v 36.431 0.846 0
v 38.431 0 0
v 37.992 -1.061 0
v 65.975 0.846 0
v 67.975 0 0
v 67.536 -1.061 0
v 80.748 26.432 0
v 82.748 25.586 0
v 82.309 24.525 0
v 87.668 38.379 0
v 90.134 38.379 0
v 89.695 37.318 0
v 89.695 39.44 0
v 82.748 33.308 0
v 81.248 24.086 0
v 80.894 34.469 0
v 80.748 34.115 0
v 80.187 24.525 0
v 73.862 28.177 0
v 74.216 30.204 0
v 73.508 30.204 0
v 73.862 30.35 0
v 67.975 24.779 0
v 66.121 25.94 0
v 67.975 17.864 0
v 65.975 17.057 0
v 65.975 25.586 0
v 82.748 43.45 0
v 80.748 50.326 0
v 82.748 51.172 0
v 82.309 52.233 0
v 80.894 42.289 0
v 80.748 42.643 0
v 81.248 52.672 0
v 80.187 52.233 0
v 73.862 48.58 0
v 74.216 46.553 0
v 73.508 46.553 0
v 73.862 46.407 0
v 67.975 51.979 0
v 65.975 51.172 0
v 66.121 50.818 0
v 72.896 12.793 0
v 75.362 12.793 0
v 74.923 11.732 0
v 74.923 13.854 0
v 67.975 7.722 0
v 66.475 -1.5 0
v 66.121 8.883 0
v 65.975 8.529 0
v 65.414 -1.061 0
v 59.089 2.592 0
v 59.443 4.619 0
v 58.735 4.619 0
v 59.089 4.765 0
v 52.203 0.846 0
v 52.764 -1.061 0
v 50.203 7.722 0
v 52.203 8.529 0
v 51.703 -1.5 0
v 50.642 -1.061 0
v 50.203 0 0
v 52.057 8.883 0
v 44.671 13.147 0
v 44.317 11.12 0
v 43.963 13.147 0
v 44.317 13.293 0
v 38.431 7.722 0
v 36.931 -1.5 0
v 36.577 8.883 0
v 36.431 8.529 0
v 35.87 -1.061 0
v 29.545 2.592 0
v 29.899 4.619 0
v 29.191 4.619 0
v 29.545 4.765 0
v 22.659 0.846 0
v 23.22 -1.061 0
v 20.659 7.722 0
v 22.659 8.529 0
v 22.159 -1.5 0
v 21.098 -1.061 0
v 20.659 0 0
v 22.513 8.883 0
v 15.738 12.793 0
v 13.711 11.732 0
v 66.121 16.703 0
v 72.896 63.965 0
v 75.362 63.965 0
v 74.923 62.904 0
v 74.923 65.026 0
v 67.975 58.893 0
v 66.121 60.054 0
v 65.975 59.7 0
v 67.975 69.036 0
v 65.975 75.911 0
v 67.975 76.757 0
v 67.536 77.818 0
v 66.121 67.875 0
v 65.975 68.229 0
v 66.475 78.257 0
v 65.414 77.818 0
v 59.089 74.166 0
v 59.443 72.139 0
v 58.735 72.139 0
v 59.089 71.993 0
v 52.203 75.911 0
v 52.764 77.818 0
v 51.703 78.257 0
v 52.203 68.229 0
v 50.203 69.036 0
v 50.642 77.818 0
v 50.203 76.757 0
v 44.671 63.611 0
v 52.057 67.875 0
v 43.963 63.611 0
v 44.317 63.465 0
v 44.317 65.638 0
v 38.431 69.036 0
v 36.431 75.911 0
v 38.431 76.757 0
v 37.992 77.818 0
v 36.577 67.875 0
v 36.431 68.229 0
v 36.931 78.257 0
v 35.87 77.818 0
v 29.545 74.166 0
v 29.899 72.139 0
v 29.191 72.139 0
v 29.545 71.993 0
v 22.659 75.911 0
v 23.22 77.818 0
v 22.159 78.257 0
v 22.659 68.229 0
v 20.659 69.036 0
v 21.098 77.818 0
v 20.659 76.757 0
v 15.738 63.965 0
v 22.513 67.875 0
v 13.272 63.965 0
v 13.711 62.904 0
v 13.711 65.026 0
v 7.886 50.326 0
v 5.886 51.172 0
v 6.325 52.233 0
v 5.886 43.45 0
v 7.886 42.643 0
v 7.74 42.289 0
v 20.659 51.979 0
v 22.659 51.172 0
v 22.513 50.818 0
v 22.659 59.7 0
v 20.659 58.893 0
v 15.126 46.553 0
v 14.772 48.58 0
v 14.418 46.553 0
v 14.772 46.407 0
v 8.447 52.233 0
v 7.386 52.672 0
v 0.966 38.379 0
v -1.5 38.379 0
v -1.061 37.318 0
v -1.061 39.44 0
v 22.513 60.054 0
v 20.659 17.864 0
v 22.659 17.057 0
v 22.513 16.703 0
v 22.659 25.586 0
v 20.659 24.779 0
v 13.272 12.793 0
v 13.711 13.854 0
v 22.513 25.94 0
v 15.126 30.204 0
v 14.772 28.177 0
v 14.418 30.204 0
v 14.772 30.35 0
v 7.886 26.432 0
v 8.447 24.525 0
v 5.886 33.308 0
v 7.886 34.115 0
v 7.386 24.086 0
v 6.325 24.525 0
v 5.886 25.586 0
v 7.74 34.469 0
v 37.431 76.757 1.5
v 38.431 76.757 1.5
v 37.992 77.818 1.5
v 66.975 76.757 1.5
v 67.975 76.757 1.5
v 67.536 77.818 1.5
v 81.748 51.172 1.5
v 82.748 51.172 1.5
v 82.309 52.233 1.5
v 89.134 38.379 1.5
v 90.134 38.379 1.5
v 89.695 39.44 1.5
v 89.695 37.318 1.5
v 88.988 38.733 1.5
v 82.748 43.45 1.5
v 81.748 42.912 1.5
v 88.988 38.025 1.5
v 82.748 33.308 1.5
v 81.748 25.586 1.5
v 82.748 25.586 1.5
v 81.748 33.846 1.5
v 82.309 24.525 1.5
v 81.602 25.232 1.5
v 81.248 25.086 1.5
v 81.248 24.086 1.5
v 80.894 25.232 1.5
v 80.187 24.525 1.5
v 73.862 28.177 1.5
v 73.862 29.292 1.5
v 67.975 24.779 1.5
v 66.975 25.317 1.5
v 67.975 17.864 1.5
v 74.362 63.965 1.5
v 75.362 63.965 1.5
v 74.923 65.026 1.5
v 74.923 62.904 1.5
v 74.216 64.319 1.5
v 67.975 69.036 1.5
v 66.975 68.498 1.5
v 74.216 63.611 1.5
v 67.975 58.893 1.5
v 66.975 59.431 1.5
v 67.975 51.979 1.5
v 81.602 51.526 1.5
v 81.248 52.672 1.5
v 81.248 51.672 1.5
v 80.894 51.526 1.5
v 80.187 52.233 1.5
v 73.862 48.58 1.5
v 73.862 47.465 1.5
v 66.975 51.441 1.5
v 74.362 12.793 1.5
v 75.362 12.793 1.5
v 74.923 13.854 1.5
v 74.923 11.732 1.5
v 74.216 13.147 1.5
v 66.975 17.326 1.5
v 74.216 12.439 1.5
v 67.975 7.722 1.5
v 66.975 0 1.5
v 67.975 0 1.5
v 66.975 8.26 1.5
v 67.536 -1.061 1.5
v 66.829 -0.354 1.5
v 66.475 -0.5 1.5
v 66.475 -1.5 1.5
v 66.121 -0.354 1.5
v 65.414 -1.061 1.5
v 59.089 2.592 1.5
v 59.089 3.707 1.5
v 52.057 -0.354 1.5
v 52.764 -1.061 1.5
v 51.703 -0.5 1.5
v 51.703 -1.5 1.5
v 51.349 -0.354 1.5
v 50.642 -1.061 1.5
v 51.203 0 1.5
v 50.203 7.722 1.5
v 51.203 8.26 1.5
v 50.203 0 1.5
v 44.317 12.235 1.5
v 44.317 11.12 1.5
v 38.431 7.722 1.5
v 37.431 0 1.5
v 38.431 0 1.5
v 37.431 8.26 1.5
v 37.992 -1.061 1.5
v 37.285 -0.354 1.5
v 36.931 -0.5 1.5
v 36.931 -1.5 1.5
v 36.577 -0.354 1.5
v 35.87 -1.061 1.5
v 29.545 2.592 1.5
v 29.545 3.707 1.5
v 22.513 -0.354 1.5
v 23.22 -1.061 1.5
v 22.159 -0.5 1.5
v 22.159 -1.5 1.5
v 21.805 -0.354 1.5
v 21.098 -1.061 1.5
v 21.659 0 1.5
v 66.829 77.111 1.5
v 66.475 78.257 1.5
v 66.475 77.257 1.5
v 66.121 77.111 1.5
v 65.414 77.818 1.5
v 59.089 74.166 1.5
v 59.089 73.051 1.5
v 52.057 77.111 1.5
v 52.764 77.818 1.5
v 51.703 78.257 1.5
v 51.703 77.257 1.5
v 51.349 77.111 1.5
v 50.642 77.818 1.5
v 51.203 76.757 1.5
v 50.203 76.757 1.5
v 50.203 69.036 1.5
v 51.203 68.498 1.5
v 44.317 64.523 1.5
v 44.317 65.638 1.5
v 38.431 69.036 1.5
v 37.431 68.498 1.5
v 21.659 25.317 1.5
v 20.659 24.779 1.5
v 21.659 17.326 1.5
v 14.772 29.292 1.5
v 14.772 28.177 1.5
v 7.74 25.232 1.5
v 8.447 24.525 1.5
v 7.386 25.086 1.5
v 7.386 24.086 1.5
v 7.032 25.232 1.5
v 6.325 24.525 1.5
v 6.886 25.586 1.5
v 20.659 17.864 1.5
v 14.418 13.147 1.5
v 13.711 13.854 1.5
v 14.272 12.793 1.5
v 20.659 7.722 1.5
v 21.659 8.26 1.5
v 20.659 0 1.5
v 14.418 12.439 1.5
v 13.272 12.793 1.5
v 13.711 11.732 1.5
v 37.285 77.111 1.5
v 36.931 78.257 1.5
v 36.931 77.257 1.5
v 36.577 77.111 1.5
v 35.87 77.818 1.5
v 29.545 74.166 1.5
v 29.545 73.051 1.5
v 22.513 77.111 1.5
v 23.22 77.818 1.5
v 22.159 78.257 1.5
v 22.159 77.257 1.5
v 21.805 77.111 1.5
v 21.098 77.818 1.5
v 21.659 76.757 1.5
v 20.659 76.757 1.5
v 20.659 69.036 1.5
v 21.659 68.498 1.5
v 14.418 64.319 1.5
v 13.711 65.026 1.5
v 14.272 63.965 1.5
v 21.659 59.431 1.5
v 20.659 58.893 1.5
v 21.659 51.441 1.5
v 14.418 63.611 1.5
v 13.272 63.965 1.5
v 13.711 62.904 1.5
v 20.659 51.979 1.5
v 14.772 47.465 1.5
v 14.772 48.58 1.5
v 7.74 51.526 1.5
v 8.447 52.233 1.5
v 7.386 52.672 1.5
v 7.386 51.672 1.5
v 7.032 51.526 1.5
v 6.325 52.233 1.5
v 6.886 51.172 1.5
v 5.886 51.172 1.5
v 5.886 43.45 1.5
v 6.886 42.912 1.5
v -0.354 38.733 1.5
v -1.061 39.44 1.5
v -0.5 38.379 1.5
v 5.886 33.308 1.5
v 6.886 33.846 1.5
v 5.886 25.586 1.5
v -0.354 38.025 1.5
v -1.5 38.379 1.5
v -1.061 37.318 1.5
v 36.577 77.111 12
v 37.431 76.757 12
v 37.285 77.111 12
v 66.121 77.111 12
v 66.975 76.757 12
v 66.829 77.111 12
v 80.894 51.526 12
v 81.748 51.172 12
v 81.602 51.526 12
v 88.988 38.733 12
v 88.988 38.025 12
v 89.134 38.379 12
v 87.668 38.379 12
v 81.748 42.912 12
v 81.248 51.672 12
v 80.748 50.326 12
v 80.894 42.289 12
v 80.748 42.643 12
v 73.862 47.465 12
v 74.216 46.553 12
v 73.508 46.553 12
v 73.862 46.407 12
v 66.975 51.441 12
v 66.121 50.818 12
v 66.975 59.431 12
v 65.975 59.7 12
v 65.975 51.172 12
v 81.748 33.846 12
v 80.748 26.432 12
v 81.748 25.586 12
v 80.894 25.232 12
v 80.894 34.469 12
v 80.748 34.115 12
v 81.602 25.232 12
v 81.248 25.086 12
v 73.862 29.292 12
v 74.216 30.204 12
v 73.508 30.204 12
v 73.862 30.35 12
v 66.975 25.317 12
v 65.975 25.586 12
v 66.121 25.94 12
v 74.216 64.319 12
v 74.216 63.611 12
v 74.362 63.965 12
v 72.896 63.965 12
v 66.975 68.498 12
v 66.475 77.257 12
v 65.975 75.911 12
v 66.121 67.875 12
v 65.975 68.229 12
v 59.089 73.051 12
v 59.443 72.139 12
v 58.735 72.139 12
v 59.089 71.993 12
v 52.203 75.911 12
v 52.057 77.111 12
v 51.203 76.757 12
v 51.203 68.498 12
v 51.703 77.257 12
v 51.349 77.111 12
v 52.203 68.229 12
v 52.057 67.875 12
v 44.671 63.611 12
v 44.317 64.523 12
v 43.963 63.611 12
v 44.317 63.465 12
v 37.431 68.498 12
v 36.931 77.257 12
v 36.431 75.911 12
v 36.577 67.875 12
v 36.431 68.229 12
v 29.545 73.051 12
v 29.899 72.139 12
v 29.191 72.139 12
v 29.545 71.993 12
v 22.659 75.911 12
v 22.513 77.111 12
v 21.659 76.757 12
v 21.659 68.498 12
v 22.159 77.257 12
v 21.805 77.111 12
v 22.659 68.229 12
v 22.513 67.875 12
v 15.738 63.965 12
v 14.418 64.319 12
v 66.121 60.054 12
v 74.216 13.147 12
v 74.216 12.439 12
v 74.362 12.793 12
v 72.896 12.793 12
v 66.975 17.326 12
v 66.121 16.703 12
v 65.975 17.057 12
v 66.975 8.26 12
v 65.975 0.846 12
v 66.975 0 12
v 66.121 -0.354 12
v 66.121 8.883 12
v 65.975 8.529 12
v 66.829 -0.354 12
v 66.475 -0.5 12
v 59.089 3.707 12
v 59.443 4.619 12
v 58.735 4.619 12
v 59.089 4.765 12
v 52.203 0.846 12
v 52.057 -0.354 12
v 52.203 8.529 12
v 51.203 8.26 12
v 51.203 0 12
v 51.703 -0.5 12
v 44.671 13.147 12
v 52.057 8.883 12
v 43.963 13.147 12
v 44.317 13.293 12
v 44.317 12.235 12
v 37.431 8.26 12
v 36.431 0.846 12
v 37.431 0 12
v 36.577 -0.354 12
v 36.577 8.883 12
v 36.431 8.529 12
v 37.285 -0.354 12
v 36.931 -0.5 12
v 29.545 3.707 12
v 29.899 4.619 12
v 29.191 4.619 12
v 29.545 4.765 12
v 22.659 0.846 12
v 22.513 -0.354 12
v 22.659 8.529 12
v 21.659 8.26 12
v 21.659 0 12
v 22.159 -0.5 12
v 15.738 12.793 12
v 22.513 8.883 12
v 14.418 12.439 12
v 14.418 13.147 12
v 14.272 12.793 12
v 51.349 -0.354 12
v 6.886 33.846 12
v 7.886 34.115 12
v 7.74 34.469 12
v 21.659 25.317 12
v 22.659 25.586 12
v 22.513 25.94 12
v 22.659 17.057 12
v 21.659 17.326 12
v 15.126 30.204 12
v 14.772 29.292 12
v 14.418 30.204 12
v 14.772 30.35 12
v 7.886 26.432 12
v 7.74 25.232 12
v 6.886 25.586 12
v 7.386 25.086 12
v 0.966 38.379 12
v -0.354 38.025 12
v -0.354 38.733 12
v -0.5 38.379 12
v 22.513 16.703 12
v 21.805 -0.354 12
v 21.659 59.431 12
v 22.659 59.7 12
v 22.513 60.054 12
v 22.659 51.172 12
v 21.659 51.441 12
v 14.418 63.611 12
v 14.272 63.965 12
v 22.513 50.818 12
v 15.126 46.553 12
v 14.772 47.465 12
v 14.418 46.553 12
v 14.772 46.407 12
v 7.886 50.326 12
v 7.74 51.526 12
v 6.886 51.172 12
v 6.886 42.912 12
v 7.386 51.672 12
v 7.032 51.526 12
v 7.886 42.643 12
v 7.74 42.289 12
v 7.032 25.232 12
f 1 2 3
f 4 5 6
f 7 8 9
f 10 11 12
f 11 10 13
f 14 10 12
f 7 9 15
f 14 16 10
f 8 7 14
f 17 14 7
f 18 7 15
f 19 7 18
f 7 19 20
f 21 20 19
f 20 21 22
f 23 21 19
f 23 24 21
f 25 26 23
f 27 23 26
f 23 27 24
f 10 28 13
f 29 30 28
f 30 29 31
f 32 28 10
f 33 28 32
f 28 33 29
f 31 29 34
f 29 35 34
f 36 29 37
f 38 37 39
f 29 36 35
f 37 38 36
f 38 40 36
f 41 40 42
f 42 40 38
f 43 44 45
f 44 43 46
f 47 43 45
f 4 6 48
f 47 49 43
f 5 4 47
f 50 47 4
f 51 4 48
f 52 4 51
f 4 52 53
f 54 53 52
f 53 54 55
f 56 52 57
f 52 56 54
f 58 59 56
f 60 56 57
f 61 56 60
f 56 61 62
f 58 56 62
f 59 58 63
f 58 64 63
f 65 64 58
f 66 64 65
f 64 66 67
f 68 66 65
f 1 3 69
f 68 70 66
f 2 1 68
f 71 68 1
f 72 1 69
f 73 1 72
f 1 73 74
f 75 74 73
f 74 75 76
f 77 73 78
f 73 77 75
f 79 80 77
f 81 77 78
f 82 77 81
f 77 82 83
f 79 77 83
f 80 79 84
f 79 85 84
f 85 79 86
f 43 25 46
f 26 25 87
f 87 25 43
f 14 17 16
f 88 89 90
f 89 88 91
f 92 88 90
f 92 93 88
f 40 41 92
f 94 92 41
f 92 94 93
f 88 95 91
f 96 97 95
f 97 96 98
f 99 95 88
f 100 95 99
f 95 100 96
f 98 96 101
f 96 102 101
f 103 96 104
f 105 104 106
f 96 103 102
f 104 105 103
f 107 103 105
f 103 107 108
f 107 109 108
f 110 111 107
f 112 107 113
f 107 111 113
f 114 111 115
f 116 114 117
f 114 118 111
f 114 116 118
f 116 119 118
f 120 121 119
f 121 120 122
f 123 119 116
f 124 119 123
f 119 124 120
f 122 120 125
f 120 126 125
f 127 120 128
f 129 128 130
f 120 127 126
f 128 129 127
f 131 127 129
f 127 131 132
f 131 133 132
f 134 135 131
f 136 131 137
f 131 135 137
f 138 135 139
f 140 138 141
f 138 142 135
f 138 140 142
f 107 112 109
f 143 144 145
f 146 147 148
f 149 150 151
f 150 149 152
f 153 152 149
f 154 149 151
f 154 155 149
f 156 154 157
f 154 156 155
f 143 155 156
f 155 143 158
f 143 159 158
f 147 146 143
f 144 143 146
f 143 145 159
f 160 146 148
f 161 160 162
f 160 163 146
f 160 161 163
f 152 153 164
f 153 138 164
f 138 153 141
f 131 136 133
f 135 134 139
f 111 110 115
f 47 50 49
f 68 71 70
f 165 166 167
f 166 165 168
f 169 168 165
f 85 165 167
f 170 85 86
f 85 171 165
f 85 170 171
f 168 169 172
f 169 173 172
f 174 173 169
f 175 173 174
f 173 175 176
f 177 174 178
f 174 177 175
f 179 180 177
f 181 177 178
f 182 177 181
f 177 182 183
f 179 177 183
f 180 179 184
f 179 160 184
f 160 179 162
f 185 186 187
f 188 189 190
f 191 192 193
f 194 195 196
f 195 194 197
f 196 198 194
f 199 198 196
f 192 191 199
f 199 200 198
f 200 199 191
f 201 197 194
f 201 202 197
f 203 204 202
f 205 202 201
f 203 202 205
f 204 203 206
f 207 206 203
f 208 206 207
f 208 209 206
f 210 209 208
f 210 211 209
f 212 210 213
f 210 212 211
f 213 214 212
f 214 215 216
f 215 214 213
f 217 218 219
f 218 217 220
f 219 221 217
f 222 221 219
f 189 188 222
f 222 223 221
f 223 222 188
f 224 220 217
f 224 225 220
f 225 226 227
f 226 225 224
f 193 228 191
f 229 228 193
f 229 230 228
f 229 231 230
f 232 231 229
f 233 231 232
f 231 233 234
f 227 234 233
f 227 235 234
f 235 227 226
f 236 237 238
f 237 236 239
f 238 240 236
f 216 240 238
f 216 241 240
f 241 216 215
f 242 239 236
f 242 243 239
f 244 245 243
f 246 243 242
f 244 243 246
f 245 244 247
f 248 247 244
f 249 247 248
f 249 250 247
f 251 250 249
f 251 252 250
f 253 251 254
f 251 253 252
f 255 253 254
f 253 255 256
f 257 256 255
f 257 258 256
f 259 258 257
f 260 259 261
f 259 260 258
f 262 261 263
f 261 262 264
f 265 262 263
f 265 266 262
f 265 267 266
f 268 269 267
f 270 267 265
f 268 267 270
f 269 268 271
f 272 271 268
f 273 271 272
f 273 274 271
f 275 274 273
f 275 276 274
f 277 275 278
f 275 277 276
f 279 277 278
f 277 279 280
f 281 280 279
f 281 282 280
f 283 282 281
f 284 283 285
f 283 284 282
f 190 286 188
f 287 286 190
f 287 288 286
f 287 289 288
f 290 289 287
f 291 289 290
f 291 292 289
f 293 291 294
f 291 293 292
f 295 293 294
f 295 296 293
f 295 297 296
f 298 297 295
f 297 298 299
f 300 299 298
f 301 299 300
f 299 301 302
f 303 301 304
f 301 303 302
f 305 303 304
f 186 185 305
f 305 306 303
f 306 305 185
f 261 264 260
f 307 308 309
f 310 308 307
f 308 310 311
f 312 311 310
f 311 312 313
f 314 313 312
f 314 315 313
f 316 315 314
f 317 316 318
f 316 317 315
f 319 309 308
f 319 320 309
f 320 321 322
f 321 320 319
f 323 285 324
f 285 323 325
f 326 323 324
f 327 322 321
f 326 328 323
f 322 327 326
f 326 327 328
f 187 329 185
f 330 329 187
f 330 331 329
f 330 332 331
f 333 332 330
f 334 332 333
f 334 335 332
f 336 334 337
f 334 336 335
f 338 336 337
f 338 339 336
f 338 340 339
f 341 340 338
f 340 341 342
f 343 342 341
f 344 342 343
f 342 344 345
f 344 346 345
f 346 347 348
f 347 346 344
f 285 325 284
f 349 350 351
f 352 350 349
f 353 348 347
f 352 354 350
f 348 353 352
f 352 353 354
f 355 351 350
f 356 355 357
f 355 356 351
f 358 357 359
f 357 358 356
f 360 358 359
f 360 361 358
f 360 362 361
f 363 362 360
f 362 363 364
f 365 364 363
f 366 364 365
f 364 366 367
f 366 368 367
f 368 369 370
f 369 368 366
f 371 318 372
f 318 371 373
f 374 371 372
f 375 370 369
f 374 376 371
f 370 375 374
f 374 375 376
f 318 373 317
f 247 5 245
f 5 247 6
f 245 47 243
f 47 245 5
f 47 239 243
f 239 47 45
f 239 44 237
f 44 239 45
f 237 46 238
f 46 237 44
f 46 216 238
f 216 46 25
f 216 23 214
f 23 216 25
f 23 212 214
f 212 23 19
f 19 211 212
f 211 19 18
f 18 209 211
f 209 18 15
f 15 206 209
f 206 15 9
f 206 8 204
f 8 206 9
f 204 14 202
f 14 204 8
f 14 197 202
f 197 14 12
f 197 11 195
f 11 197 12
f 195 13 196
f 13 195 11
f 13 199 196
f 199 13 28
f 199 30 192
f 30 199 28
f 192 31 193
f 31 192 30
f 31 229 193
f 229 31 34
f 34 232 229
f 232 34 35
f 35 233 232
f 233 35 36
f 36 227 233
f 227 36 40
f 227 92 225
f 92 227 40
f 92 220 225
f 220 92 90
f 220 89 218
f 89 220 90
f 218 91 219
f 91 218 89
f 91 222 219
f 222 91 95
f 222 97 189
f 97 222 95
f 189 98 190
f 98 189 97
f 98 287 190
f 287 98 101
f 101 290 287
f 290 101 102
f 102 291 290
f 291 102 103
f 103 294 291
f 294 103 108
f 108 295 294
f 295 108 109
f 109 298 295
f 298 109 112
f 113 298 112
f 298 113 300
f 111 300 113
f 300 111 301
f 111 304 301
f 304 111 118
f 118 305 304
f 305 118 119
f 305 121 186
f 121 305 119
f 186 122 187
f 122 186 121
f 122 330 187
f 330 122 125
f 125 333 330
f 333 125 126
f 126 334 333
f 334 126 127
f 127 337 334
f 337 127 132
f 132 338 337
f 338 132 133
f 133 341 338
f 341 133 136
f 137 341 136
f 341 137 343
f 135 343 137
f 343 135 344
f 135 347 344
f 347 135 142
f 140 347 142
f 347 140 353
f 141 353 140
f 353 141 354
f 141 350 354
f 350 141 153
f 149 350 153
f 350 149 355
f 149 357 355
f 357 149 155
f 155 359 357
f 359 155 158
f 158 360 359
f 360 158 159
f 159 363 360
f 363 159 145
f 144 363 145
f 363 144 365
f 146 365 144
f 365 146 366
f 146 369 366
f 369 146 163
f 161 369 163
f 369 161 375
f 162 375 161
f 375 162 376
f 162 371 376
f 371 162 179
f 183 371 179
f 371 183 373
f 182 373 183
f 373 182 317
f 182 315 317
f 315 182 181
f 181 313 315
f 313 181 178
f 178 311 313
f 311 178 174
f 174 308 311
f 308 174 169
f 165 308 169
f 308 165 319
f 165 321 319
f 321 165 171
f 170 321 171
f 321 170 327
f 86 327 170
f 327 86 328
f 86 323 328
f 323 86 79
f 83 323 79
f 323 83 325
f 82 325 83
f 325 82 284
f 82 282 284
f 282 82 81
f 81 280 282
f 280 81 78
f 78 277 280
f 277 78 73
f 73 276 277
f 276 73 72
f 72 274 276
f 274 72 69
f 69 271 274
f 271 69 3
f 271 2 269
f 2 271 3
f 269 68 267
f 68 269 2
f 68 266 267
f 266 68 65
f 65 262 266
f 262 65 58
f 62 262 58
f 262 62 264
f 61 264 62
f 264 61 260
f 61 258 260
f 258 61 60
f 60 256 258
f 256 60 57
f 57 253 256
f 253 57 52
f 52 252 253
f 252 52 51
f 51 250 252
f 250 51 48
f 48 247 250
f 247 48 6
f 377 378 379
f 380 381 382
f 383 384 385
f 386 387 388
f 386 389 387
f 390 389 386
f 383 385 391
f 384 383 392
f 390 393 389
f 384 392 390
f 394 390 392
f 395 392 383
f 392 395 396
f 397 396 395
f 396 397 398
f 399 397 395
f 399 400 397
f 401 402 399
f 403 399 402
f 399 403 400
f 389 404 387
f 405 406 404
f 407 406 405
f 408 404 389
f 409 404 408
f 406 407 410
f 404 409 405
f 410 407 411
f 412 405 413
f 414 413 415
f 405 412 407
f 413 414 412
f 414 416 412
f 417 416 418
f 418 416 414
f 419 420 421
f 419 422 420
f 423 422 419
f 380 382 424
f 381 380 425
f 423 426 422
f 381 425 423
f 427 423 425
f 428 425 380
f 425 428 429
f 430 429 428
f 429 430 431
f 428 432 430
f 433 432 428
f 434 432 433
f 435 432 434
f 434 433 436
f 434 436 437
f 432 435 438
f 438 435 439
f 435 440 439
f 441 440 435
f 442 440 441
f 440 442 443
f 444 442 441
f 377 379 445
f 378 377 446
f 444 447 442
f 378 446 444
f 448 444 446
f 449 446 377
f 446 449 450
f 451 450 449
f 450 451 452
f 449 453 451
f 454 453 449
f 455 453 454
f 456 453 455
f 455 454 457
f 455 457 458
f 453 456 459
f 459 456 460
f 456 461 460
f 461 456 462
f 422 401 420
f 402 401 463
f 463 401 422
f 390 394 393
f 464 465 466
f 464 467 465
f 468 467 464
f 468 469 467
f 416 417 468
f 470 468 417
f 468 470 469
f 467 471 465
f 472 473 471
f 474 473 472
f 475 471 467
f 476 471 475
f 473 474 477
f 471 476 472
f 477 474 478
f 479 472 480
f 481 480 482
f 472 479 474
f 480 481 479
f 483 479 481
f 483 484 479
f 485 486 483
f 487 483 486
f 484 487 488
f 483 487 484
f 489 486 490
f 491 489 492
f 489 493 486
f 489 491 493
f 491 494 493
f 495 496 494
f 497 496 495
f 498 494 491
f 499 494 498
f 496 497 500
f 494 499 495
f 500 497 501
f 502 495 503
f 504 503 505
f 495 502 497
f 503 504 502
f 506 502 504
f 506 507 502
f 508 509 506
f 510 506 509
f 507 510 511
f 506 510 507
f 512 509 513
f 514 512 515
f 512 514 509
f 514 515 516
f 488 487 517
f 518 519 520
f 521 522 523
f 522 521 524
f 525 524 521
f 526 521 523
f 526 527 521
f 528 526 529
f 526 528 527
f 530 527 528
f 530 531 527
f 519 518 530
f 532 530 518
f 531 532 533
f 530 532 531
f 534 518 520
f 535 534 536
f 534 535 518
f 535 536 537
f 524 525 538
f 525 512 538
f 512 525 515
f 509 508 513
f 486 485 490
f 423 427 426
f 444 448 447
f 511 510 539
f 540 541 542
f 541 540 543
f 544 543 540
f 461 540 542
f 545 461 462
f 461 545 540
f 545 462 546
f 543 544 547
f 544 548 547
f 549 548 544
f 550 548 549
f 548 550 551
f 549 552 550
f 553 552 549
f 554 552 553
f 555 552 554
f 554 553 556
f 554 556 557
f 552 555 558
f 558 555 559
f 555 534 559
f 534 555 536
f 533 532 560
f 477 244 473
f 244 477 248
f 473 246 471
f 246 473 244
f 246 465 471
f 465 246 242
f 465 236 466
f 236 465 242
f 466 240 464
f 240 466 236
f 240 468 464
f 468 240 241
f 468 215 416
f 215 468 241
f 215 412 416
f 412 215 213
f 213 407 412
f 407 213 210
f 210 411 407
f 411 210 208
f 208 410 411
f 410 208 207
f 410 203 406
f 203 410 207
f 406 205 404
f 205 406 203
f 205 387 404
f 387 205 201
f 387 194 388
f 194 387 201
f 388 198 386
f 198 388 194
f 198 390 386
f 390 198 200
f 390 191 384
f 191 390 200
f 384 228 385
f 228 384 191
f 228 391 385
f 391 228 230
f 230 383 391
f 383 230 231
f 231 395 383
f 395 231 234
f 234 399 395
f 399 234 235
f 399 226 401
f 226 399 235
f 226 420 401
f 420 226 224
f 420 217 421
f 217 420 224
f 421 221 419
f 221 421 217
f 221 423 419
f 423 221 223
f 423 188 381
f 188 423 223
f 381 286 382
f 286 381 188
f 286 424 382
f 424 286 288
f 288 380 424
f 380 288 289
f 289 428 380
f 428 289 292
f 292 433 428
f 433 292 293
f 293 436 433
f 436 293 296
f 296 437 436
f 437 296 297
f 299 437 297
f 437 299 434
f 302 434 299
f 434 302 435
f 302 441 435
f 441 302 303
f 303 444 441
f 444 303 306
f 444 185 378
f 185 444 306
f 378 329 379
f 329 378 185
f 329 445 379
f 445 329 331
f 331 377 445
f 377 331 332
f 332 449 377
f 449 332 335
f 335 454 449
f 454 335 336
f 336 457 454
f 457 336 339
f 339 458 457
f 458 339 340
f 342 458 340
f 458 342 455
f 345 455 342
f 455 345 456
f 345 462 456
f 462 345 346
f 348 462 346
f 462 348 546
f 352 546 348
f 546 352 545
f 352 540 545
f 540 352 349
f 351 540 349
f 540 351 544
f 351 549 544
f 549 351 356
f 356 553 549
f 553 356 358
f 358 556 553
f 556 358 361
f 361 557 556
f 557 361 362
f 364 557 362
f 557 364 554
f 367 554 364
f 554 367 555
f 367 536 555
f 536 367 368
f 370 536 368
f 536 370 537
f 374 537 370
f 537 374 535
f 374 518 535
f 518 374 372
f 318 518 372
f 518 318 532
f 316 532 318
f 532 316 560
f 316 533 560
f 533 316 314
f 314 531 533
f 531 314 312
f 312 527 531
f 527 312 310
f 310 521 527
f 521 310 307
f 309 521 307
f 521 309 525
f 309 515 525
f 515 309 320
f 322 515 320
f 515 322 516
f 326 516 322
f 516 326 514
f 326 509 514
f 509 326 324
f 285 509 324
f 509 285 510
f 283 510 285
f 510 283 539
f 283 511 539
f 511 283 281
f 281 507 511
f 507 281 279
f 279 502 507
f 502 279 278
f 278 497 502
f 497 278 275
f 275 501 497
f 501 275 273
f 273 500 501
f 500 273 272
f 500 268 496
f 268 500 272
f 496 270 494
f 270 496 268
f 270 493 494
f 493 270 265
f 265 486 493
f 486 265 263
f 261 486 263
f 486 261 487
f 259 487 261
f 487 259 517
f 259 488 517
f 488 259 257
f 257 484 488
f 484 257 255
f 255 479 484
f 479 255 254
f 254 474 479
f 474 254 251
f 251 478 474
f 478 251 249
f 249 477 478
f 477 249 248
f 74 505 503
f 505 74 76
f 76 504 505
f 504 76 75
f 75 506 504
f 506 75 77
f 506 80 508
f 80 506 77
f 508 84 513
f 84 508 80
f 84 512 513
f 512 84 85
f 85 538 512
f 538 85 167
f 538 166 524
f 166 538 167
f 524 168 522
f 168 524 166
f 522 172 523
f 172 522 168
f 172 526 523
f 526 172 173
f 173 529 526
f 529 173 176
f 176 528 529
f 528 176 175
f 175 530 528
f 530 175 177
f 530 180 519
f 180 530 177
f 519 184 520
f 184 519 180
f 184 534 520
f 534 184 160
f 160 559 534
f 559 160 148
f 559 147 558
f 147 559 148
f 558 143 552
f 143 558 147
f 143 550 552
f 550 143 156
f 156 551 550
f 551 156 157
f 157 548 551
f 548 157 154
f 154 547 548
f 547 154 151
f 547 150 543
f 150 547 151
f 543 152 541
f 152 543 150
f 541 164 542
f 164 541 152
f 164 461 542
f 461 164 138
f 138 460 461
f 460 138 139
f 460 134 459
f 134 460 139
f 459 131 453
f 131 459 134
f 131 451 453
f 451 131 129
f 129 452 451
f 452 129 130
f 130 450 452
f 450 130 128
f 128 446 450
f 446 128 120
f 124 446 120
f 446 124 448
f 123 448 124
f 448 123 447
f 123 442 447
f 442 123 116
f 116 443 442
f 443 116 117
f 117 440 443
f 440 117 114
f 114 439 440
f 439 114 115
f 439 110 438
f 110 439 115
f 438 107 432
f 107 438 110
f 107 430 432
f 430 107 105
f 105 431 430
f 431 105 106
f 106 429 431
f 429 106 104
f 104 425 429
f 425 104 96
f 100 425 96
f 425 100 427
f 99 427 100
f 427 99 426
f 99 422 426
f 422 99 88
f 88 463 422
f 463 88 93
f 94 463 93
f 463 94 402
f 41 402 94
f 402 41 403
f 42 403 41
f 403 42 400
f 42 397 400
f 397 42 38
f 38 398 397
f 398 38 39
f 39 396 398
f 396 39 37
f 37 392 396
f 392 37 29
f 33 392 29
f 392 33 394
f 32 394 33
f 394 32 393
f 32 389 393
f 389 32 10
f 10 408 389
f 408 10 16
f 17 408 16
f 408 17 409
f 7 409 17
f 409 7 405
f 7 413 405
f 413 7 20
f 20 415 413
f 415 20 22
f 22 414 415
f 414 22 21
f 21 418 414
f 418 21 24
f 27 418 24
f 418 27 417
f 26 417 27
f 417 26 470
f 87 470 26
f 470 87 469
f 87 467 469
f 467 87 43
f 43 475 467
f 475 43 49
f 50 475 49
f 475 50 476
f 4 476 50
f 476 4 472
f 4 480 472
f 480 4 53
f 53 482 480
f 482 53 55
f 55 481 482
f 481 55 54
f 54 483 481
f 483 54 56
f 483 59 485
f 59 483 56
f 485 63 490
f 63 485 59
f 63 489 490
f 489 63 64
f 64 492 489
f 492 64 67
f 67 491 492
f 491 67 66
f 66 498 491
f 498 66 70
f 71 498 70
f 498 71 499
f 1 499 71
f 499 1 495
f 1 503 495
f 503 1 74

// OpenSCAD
// OpenSCAD file automatically generated by svg2cookiercutter.py
wallHeight = 12;
wallFlareWidth = 3;
wallFlareThickness = 1.5;
minWallWidth = 1;
maxWallWidth = 3;
insideWallFlareWidth = 2;
insideWallFlareThickness = 1.5;
minInsideWallWidth = 1;
maxInsideWallWidth = 3;
featureHeight = 8;
minFeatureThickness = 0.8;
maxFeatureThickness = 3;
connectorThickness = 1;
size = 88.634;

module dummy() {}

scale = size/88.634;

module ribbon(points, thickness=1, closed=false) {
    p = closed ? concat(points, [points[0]]) : points;
    
    union() {
        for (i=[1:len(p)-1]) {
            hull() {
                translate(p[i-1]) circle(d=thickness, $fn=8);
                translate(p[i]) circle(d=thickness, $fn=8);
            }
        }
    }
}

module cookieCutter() {

path0=scale*[[-66.303,7.504],[-66.303,16.033],[-73.690,20.297],[-66.303,24.561],[-66.303,33.090],[-73.690,37.354],[-81.076,33.090],[-81.076,41.619],[-88.462,45.883],[-81.076,50.147],[-81.076,58.676],[-73.690,54.411],[-66.303,58.676],[-66.303,67.204],[-73.690,71.469],[-66.303,75.733],[-66.303,84.261],[-58.917,79.997],[-51.531,84.261],[-51.531,75.733],[-44.145,71.469],[-36.759,75.733],[-36.759,84.261],[-29.373,79.997],[-21.987,84.261],[-21.987,75.733],[-14.600,71.469],[-21.987,67.204],[-21.987,58.676],[-14.600,54.411],[-7.214,58.676],[-7.214,50.147],[0.172,45.883],[-7.214,41.619],[-7.214,33.090],[-14.600,37.354],[-21.987,33.090],[-21.987,24.561],[-14.600,20.297],[-21.987,16.033],[-21.987,7.504],[-29.373,11.769],[-36.759,7.504],[-36.759,16.033],[-44.145,20.297],[-51.531,16.033],[-51.531,7.504],[-58.917,11.769],[-66.303,7.504]];
render(convexity=10) linear_extrude(height=(wallHeight)) ribbon(path0,thickness=min(maxWallWidth,max(0.133,minWallWidth)));
difference() {
 render(convexity=10) linear_extrude(height=wallFlareThickness) ribbon(path0,thickness=wallFlareWidth);
 translate([0,0,-0.01]) linear_extrude(height=wallFlareThickness+0.02) polygon(points=path0);
}
}

translate([88.462*scale,-7.504*scale,0]) cookieCutter();
